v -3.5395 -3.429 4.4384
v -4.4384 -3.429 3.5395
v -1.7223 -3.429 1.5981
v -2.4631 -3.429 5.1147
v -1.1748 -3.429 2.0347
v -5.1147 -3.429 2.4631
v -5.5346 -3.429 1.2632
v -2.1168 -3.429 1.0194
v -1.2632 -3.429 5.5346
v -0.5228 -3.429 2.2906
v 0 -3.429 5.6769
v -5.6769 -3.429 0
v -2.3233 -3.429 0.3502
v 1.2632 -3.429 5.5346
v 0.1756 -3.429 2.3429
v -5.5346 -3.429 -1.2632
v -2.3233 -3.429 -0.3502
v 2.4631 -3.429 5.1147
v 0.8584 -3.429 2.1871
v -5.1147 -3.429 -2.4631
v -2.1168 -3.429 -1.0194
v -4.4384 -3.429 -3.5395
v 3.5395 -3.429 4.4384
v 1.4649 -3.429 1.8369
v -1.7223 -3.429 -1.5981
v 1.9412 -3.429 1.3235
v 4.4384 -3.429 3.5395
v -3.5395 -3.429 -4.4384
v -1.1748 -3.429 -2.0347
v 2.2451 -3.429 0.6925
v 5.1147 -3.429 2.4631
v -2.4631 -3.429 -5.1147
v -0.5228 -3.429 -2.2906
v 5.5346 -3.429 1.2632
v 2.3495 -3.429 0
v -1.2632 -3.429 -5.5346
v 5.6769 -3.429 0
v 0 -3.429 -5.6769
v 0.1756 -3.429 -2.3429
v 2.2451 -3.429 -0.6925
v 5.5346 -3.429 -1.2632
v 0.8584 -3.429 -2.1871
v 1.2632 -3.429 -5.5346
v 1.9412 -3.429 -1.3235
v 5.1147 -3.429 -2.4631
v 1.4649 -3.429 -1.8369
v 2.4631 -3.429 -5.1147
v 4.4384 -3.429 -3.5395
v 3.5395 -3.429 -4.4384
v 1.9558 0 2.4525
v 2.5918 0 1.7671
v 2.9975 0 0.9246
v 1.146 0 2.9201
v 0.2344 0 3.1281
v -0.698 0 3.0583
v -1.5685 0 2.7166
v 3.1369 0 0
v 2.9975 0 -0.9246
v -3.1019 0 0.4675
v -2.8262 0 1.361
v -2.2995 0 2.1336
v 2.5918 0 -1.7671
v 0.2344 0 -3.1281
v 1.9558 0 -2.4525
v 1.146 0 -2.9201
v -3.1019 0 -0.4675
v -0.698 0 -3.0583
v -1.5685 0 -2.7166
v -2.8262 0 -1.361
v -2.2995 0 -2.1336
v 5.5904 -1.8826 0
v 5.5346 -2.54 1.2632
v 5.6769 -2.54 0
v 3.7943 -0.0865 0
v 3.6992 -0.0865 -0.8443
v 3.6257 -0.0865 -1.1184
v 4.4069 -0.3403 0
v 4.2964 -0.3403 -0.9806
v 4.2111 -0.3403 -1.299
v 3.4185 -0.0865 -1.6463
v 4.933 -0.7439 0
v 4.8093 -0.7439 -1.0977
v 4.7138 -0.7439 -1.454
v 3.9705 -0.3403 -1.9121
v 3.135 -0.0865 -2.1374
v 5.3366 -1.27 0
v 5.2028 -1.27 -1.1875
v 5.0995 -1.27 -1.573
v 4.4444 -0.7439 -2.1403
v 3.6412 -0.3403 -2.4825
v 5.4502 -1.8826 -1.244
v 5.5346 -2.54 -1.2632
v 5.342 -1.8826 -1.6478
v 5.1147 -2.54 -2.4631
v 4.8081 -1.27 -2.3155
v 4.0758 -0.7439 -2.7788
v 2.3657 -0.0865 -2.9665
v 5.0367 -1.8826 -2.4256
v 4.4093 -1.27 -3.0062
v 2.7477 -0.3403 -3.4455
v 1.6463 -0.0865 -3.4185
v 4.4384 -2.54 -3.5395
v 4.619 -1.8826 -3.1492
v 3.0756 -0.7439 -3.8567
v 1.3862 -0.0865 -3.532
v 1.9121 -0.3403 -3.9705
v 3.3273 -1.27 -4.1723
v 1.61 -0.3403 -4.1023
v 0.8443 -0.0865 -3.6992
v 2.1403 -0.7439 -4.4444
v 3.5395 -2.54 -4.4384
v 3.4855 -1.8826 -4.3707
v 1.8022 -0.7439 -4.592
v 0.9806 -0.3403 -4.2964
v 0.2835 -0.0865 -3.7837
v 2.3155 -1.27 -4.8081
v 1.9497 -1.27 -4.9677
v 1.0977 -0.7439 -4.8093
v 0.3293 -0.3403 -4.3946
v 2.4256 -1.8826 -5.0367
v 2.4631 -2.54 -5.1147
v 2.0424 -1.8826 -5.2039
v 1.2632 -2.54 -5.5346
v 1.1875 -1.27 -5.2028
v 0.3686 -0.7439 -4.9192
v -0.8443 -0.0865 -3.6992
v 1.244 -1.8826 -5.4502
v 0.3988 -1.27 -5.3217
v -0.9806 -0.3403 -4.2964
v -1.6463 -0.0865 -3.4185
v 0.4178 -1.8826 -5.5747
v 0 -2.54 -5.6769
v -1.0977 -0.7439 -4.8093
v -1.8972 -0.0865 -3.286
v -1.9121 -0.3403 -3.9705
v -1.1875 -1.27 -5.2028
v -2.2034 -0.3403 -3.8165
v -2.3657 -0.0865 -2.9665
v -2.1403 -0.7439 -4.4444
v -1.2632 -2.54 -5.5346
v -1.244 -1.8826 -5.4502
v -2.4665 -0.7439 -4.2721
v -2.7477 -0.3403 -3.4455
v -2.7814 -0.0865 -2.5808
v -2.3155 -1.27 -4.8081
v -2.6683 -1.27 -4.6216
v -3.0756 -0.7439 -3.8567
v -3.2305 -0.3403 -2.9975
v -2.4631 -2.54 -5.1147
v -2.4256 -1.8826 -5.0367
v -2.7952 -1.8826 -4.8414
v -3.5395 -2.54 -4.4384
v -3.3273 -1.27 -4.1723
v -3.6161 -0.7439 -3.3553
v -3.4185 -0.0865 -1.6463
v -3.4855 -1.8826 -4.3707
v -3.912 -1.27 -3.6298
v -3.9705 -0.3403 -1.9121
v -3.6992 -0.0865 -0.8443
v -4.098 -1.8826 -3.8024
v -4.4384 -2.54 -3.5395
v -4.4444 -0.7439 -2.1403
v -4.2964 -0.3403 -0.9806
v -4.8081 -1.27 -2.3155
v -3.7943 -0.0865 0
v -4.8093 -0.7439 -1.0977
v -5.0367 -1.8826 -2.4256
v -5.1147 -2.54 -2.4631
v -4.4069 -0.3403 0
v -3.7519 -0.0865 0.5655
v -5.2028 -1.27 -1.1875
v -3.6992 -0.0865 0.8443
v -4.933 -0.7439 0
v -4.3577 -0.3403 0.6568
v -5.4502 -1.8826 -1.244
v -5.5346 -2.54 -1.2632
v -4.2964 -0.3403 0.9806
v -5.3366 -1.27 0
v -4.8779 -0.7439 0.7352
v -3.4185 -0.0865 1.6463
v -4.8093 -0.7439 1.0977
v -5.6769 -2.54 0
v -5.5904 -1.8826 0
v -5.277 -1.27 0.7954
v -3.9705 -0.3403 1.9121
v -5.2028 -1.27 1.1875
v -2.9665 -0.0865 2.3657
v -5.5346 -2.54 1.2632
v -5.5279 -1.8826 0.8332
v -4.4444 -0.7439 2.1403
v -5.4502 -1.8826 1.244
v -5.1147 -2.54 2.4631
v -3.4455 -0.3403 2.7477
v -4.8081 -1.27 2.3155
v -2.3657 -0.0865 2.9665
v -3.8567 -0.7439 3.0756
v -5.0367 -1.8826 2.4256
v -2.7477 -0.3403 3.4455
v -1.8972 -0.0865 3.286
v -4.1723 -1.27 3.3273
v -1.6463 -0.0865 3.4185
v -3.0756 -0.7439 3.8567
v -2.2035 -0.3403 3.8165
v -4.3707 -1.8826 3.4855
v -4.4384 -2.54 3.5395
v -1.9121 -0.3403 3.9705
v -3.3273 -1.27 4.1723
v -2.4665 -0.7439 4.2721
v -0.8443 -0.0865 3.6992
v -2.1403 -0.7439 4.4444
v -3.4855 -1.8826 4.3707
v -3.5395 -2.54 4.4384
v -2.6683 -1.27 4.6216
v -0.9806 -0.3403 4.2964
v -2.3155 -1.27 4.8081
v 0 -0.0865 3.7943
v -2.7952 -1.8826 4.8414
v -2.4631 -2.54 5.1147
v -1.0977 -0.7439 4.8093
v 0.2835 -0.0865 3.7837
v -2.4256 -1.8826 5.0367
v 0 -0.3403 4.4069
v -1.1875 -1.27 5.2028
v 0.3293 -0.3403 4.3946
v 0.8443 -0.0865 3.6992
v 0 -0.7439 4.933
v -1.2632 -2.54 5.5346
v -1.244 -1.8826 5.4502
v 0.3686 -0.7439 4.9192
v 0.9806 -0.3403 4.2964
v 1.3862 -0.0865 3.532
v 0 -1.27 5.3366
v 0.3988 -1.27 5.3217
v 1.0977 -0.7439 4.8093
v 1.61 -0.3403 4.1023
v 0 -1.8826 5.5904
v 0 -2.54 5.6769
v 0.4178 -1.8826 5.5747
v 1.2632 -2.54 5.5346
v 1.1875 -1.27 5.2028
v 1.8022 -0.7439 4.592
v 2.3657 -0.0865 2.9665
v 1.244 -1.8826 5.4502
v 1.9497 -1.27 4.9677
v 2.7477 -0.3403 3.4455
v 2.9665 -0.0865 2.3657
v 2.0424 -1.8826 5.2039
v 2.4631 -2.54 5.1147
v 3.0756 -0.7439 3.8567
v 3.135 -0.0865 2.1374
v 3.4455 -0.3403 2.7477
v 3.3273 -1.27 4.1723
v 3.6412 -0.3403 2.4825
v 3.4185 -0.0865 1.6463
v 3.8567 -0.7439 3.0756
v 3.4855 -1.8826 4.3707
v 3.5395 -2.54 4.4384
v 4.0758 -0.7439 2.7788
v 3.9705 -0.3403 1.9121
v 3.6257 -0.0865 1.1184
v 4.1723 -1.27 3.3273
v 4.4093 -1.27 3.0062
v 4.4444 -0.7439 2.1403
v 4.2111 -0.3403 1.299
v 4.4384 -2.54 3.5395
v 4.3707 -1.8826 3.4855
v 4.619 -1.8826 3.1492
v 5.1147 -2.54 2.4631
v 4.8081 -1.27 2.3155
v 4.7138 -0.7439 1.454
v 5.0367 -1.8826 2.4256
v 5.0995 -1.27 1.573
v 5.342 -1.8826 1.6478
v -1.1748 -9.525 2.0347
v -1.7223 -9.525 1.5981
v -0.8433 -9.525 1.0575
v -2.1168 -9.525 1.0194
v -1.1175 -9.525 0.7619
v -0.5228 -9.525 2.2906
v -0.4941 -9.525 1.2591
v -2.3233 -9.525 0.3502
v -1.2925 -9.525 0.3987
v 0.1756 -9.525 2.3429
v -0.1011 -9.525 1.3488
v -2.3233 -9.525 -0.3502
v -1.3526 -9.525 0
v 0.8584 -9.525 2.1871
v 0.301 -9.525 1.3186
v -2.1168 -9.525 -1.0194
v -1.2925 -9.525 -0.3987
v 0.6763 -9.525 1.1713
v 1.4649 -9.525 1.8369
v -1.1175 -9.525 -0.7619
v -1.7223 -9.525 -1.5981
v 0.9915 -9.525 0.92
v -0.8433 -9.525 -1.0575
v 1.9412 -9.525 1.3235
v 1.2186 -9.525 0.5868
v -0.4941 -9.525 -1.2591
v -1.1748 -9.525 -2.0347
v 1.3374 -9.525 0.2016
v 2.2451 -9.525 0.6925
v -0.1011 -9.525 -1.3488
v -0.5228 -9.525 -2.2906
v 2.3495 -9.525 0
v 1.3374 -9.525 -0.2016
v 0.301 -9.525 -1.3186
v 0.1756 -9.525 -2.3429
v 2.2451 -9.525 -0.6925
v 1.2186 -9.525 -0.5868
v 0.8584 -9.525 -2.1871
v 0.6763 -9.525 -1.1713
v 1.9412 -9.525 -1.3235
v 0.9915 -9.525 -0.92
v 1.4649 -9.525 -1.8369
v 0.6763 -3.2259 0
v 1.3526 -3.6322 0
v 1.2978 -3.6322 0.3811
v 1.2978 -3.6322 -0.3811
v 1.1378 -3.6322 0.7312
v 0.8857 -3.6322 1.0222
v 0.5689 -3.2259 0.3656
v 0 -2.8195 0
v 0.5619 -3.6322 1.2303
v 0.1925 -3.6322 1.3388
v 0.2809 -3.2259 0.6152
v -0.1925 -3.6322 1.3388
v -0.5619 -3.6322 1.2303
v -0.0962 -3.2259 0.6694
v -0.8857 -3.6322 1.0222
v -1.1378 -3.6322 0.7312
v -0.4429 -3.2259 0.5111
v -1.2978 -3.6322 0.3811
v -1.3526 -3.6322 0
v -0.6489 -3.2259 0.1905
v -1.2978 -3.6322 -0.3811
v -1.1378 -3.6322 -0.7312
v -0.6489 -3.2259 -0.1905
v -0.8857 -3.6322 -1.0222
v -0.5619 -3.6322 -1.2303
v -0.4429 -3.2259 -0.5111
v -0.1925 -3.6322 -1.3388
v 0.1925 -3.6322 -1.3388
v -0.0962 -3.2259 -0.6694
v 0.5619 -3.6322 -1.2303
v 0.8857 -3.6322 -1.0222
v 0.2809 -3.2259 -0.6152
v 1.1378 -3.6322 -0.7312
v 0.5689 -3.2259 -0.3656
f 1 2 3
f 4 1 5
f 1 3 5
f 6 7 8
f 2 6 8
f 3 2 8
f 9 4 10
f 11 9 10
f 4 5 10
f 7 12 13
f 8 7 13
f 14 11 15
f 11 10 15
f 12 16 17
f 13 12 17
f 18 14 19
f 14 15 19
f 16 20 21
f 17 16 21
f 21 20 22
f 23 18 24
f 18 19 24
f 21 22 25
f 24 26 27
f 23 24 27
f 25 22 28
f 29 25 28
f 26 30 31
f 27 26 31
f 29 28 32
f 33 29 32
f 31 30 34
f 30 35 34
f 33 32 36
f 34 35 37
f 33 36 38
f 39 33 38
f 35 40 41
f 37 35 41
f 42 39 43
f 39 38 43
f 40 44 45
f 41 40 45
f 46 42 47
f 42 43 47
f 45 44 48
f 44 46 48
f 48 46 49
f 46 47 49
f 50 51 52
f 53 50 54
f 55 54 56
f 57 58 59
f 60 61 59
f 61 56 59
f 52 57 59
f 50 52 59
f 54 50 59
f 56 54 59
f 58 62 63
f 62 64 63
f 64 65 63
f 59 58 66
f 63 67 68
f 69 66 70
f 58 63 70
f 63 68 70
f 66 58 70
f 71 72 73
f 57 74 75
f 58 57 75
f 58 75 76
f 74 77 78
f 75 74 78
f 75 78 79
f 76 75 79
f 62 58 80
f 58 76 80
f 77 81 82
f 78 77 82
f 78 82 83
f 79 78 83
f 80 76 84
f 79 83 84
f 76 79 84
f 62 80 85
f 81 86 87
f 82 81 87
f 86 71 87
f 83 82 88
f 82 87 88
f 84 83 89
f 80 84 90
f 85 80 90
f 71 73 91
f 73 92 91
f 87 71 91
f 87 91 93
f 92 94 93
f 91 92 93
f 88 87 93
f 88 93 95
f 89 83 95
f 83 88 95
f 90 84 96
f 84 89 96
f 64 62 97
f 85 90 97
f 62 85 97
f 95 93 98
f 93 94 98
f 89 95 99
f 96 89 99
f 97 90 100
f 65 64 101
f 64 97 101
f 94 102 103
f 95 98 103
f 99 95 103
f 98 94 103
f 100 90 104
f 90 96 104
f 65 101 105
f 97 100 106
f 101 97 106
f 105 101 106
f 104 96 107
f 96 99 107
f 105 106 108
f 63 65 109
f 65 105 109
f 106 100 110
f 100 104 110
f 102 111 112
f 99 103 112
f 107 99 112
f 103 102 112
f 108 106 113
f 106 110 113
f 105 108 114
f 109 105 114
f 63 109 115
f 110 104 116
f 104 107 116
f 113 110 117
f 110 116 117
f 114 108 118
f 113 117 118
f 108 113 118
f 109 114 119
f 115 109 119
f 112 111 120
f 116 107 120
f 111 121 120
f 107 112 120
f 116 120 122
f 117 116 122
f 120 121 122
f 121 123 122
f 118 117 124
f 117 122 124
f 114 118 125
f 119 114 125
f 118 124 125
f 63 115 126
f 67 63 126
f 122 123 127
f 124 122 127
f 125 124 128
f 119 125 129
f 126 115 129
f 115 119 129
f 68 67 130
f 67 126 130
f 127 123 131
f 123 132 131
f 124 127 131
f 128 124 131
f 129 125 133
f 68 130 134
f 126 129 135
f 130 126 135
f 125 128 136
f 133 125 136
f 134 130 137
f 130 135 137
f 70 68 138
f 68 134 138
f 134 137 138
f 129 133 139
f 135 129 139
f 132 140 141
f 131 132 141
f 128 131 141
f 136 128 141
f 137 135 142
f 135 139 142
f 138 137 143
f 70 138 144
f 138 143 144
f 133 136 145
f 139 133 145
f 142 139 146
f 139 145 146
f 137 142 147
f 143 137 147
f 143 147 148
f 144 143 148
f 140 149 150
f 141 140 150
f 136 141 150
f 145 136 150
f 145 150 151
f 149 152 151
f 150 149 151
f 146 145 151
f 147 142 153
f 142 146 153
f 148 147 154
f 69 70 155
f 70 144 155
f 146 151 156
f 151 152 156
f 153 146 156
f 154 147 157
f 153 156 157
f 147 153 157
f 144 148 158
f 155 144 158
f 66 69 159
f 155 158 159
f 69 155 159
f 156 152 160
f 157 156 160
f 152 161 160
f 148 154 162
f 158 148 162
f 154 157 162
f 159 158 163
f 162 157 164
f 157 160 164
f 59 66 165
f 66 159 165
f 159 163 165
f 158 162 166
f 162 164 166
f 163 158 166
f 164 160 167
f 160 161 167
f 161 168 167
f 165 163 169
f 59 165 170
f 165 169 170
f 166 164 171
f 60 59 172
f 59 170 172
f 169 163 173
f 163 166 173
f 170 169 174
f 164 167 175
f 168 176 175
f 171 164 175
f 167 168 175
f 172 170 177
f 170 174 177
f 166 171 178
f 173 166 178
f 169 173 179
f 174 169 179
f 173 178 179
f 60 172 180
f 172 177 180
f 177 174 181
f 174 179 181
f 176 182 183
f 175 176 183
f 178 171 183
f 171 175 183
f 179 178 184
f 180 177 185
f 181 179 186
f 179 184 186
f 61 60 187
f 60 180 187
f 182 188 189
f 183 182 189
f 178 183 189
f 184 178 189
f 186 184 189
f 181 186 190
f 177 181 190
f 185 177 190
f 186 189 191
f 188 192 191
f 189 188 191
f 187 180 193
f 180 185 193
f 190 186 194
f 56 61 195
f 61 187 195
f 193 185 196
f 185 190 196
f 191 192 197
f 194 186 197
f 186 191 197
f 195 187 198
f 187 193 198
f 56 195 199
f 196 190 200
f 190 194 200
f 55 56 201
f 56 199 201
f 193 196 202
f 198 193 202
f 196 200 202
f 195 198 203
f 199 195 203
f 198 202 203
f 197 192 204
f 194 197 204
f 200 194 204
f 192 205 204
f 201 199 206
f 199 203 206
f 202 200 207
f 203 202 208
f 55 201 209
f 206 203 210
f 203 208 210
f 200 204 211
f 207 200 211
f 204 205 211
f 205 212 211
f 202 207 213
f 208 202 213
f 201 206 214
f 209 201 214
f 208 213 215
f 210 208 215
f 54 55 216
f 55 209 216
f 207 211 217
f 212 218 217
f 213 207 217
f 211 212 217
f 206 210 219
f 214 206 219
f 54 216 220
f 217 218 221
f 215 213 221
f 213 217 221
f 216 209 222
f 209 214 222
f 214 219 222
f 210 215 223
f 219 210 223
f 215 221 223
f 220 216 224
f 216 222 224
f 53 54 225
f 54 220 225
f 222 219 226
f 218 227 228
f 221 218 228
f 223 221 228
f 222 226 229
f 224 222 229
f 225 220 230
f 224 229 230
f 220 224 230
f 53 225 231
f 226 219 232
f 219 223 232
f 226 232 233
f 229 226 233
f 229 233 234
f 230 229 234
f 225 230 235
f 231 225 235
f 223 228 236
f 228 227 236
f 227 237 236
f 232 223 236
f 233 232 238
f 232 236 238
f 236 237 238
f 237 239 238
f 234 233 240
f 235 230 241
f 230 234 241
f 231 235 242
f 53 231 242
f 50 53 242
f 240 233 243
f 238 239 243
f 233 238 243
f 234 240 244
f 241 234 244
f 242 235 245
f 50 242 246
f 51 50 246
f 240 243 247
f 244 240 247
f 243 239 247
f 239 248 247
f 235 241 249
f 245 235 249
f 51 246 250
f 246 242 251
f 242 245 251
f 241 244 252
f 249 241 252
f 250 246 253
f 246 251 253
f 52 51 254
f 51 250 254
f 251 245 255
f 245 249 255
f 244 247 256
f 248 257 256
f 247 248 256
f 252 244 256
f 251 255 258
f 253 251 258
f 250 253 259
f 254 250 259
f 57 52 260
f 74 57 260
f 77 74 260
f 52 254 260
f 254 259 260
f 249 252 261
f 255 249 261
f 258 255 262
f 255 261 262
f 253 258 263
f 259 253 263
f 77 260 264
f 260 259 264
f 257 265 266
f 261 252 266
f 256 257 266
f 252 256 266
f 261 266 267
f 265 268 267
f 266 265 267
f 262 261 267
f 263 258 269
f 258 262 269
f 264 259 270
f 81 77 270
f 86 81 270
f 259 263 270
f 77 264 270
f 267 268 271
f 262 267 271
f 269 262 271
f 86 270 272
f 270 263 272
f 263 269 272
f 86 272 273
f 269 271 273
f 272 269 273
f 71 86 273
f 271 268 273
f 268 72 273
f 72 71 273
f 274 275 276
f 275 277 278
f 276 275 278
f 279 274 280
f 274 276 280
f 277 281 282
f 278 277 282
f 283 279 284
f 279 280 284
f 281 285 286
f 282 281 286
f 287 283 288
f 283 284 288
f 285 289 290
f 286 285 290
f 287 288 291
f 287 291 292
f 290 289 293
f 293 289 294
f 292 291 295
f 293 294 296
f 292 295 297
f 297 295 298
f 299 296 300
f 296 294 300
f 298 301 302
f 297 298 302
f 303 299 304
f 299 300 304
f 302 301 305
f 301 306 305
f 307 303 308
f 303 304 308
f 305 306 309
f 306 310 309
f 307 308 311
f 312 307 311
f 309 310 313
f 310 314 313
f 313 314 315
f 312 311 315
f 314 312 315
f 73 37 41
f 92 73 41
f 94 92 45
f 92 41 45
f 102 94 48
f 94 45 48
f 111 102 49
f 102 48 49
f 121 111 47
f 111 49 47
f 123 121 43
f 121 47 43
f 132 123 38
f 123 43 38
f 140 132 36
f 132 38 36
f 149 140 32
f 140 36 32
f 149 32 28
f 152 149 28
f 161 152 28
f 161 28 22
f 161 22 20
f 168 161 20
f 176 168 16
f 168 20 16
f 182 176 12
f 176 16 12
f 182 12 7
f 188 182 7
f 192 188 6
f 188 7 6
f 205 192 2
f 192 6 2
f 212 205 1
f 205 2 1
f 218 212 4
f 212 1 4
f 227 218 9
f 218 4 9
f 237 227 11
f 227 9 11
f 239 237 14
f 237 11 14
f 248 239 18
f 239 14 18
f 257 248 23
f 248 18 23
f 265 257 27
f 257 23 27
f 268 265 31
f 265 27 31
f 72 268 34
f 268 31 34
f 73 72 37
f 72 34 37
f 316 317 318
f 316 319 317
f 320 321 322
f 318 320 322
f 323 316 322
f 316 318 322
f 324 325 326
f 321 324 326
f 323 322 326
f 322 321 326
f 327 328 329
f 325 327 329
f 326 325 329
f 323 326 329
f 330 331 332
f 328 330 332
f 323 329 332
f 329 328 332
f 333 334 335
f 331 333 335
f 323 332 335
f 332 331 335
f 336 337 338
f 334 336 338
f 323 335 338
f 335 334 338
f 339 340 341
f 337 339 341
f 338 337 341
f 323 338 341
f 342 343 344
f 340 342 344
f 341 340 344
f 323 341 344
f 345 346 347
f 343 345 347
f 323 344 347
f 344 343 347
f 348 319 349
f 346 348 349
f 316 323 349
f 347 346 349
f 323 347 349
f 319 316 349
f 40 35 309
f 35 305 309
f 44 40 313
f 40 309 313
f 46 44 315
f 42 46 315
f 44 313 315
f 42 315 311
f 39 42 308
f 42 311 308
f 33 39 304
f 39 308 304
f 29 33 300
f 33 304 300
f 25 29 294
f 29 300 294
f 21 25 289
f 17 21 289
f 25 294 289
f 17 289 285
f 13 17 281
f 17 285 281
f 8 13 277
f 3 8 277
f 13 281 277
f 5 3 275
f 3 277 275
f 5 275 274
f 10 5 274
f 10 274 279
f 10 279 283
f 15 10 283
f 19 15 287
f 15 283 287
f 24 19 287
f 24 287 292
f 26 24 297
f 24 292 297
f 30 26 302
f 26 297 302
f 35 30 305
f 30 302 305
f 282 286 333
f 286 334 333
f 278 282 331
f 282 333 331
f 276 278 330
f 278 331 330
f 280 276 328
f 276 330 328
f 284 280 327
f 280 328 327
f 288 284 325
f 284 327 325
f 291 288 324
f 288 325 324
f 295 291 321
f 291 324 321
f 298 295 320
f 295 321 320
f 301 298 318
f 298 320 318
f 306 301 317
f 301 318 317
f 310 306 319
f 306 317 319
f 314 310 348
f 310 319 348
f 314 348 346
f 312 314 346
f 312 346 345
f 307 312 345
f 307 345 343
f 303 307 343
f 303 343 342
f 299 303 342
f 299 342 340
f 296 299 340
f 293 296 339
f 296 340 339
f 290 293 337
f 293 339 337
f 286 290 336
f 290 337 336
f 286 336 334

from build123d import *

# Parameters (mm, degrees)
FILLET1_R                 = 2.54
F_6_32_TAPPED_HOLE1_D     = 2.7051
F_6_32_TAPPED_HOLE1_DEPTH = 5.8928
F_6_32_TAPPED_HOLE1_TIP   = 0.81269403


with BuildPart() as part:
    # Sketch1 → Revolve1 (revolve)
    with BuildSketch(Plane.XY, mode=Mode.PRIVATE) as revolve1_sk:
        Polygon((0, 0), (-5.6769, 0), (-5.6769, -3.429), (-2.3495, -3.429), (-2.3495, -9.525), (0, -9.525), align=None)
    revolve(revolve1_sk.sketch.rotate(Axis((0, -9.525, 0), (0, 1, 0)), 180), axis=Axis((0, -9.525, 0), (0, 1, 0)))

    # Fillet1
    fillet1_edges = [part.edges().sort_by_distance(p)[0] for p in [
        (-5.6769, 0, 0),
    ]]
    fillet(fillet1_edges, radius=FILLET1_R)

    # #6-32 Tapped Hole1
    with Locations(Plane.XZ.offset(9.525)):
        with Locations((0, 0)):
            Hole(F_6_32_TAPPED_HOLE1_D / 2, depth=F_6_32_TAPPED_HOLE1_DEPTH)
            with Locations((0, 0, -(F_6_32_TAPPED_HOLE1_DEPTH + F_6_32_TAPPED_HOLE1_TIP / 2))):  # 118° drill point
                Cone(0, F_6_32_TAPPED_HOLE1_D / 2, F_6_32_TAPPED_HOLE1_TIP, mode=Mode.SUBTRACT)


solid = part.part
